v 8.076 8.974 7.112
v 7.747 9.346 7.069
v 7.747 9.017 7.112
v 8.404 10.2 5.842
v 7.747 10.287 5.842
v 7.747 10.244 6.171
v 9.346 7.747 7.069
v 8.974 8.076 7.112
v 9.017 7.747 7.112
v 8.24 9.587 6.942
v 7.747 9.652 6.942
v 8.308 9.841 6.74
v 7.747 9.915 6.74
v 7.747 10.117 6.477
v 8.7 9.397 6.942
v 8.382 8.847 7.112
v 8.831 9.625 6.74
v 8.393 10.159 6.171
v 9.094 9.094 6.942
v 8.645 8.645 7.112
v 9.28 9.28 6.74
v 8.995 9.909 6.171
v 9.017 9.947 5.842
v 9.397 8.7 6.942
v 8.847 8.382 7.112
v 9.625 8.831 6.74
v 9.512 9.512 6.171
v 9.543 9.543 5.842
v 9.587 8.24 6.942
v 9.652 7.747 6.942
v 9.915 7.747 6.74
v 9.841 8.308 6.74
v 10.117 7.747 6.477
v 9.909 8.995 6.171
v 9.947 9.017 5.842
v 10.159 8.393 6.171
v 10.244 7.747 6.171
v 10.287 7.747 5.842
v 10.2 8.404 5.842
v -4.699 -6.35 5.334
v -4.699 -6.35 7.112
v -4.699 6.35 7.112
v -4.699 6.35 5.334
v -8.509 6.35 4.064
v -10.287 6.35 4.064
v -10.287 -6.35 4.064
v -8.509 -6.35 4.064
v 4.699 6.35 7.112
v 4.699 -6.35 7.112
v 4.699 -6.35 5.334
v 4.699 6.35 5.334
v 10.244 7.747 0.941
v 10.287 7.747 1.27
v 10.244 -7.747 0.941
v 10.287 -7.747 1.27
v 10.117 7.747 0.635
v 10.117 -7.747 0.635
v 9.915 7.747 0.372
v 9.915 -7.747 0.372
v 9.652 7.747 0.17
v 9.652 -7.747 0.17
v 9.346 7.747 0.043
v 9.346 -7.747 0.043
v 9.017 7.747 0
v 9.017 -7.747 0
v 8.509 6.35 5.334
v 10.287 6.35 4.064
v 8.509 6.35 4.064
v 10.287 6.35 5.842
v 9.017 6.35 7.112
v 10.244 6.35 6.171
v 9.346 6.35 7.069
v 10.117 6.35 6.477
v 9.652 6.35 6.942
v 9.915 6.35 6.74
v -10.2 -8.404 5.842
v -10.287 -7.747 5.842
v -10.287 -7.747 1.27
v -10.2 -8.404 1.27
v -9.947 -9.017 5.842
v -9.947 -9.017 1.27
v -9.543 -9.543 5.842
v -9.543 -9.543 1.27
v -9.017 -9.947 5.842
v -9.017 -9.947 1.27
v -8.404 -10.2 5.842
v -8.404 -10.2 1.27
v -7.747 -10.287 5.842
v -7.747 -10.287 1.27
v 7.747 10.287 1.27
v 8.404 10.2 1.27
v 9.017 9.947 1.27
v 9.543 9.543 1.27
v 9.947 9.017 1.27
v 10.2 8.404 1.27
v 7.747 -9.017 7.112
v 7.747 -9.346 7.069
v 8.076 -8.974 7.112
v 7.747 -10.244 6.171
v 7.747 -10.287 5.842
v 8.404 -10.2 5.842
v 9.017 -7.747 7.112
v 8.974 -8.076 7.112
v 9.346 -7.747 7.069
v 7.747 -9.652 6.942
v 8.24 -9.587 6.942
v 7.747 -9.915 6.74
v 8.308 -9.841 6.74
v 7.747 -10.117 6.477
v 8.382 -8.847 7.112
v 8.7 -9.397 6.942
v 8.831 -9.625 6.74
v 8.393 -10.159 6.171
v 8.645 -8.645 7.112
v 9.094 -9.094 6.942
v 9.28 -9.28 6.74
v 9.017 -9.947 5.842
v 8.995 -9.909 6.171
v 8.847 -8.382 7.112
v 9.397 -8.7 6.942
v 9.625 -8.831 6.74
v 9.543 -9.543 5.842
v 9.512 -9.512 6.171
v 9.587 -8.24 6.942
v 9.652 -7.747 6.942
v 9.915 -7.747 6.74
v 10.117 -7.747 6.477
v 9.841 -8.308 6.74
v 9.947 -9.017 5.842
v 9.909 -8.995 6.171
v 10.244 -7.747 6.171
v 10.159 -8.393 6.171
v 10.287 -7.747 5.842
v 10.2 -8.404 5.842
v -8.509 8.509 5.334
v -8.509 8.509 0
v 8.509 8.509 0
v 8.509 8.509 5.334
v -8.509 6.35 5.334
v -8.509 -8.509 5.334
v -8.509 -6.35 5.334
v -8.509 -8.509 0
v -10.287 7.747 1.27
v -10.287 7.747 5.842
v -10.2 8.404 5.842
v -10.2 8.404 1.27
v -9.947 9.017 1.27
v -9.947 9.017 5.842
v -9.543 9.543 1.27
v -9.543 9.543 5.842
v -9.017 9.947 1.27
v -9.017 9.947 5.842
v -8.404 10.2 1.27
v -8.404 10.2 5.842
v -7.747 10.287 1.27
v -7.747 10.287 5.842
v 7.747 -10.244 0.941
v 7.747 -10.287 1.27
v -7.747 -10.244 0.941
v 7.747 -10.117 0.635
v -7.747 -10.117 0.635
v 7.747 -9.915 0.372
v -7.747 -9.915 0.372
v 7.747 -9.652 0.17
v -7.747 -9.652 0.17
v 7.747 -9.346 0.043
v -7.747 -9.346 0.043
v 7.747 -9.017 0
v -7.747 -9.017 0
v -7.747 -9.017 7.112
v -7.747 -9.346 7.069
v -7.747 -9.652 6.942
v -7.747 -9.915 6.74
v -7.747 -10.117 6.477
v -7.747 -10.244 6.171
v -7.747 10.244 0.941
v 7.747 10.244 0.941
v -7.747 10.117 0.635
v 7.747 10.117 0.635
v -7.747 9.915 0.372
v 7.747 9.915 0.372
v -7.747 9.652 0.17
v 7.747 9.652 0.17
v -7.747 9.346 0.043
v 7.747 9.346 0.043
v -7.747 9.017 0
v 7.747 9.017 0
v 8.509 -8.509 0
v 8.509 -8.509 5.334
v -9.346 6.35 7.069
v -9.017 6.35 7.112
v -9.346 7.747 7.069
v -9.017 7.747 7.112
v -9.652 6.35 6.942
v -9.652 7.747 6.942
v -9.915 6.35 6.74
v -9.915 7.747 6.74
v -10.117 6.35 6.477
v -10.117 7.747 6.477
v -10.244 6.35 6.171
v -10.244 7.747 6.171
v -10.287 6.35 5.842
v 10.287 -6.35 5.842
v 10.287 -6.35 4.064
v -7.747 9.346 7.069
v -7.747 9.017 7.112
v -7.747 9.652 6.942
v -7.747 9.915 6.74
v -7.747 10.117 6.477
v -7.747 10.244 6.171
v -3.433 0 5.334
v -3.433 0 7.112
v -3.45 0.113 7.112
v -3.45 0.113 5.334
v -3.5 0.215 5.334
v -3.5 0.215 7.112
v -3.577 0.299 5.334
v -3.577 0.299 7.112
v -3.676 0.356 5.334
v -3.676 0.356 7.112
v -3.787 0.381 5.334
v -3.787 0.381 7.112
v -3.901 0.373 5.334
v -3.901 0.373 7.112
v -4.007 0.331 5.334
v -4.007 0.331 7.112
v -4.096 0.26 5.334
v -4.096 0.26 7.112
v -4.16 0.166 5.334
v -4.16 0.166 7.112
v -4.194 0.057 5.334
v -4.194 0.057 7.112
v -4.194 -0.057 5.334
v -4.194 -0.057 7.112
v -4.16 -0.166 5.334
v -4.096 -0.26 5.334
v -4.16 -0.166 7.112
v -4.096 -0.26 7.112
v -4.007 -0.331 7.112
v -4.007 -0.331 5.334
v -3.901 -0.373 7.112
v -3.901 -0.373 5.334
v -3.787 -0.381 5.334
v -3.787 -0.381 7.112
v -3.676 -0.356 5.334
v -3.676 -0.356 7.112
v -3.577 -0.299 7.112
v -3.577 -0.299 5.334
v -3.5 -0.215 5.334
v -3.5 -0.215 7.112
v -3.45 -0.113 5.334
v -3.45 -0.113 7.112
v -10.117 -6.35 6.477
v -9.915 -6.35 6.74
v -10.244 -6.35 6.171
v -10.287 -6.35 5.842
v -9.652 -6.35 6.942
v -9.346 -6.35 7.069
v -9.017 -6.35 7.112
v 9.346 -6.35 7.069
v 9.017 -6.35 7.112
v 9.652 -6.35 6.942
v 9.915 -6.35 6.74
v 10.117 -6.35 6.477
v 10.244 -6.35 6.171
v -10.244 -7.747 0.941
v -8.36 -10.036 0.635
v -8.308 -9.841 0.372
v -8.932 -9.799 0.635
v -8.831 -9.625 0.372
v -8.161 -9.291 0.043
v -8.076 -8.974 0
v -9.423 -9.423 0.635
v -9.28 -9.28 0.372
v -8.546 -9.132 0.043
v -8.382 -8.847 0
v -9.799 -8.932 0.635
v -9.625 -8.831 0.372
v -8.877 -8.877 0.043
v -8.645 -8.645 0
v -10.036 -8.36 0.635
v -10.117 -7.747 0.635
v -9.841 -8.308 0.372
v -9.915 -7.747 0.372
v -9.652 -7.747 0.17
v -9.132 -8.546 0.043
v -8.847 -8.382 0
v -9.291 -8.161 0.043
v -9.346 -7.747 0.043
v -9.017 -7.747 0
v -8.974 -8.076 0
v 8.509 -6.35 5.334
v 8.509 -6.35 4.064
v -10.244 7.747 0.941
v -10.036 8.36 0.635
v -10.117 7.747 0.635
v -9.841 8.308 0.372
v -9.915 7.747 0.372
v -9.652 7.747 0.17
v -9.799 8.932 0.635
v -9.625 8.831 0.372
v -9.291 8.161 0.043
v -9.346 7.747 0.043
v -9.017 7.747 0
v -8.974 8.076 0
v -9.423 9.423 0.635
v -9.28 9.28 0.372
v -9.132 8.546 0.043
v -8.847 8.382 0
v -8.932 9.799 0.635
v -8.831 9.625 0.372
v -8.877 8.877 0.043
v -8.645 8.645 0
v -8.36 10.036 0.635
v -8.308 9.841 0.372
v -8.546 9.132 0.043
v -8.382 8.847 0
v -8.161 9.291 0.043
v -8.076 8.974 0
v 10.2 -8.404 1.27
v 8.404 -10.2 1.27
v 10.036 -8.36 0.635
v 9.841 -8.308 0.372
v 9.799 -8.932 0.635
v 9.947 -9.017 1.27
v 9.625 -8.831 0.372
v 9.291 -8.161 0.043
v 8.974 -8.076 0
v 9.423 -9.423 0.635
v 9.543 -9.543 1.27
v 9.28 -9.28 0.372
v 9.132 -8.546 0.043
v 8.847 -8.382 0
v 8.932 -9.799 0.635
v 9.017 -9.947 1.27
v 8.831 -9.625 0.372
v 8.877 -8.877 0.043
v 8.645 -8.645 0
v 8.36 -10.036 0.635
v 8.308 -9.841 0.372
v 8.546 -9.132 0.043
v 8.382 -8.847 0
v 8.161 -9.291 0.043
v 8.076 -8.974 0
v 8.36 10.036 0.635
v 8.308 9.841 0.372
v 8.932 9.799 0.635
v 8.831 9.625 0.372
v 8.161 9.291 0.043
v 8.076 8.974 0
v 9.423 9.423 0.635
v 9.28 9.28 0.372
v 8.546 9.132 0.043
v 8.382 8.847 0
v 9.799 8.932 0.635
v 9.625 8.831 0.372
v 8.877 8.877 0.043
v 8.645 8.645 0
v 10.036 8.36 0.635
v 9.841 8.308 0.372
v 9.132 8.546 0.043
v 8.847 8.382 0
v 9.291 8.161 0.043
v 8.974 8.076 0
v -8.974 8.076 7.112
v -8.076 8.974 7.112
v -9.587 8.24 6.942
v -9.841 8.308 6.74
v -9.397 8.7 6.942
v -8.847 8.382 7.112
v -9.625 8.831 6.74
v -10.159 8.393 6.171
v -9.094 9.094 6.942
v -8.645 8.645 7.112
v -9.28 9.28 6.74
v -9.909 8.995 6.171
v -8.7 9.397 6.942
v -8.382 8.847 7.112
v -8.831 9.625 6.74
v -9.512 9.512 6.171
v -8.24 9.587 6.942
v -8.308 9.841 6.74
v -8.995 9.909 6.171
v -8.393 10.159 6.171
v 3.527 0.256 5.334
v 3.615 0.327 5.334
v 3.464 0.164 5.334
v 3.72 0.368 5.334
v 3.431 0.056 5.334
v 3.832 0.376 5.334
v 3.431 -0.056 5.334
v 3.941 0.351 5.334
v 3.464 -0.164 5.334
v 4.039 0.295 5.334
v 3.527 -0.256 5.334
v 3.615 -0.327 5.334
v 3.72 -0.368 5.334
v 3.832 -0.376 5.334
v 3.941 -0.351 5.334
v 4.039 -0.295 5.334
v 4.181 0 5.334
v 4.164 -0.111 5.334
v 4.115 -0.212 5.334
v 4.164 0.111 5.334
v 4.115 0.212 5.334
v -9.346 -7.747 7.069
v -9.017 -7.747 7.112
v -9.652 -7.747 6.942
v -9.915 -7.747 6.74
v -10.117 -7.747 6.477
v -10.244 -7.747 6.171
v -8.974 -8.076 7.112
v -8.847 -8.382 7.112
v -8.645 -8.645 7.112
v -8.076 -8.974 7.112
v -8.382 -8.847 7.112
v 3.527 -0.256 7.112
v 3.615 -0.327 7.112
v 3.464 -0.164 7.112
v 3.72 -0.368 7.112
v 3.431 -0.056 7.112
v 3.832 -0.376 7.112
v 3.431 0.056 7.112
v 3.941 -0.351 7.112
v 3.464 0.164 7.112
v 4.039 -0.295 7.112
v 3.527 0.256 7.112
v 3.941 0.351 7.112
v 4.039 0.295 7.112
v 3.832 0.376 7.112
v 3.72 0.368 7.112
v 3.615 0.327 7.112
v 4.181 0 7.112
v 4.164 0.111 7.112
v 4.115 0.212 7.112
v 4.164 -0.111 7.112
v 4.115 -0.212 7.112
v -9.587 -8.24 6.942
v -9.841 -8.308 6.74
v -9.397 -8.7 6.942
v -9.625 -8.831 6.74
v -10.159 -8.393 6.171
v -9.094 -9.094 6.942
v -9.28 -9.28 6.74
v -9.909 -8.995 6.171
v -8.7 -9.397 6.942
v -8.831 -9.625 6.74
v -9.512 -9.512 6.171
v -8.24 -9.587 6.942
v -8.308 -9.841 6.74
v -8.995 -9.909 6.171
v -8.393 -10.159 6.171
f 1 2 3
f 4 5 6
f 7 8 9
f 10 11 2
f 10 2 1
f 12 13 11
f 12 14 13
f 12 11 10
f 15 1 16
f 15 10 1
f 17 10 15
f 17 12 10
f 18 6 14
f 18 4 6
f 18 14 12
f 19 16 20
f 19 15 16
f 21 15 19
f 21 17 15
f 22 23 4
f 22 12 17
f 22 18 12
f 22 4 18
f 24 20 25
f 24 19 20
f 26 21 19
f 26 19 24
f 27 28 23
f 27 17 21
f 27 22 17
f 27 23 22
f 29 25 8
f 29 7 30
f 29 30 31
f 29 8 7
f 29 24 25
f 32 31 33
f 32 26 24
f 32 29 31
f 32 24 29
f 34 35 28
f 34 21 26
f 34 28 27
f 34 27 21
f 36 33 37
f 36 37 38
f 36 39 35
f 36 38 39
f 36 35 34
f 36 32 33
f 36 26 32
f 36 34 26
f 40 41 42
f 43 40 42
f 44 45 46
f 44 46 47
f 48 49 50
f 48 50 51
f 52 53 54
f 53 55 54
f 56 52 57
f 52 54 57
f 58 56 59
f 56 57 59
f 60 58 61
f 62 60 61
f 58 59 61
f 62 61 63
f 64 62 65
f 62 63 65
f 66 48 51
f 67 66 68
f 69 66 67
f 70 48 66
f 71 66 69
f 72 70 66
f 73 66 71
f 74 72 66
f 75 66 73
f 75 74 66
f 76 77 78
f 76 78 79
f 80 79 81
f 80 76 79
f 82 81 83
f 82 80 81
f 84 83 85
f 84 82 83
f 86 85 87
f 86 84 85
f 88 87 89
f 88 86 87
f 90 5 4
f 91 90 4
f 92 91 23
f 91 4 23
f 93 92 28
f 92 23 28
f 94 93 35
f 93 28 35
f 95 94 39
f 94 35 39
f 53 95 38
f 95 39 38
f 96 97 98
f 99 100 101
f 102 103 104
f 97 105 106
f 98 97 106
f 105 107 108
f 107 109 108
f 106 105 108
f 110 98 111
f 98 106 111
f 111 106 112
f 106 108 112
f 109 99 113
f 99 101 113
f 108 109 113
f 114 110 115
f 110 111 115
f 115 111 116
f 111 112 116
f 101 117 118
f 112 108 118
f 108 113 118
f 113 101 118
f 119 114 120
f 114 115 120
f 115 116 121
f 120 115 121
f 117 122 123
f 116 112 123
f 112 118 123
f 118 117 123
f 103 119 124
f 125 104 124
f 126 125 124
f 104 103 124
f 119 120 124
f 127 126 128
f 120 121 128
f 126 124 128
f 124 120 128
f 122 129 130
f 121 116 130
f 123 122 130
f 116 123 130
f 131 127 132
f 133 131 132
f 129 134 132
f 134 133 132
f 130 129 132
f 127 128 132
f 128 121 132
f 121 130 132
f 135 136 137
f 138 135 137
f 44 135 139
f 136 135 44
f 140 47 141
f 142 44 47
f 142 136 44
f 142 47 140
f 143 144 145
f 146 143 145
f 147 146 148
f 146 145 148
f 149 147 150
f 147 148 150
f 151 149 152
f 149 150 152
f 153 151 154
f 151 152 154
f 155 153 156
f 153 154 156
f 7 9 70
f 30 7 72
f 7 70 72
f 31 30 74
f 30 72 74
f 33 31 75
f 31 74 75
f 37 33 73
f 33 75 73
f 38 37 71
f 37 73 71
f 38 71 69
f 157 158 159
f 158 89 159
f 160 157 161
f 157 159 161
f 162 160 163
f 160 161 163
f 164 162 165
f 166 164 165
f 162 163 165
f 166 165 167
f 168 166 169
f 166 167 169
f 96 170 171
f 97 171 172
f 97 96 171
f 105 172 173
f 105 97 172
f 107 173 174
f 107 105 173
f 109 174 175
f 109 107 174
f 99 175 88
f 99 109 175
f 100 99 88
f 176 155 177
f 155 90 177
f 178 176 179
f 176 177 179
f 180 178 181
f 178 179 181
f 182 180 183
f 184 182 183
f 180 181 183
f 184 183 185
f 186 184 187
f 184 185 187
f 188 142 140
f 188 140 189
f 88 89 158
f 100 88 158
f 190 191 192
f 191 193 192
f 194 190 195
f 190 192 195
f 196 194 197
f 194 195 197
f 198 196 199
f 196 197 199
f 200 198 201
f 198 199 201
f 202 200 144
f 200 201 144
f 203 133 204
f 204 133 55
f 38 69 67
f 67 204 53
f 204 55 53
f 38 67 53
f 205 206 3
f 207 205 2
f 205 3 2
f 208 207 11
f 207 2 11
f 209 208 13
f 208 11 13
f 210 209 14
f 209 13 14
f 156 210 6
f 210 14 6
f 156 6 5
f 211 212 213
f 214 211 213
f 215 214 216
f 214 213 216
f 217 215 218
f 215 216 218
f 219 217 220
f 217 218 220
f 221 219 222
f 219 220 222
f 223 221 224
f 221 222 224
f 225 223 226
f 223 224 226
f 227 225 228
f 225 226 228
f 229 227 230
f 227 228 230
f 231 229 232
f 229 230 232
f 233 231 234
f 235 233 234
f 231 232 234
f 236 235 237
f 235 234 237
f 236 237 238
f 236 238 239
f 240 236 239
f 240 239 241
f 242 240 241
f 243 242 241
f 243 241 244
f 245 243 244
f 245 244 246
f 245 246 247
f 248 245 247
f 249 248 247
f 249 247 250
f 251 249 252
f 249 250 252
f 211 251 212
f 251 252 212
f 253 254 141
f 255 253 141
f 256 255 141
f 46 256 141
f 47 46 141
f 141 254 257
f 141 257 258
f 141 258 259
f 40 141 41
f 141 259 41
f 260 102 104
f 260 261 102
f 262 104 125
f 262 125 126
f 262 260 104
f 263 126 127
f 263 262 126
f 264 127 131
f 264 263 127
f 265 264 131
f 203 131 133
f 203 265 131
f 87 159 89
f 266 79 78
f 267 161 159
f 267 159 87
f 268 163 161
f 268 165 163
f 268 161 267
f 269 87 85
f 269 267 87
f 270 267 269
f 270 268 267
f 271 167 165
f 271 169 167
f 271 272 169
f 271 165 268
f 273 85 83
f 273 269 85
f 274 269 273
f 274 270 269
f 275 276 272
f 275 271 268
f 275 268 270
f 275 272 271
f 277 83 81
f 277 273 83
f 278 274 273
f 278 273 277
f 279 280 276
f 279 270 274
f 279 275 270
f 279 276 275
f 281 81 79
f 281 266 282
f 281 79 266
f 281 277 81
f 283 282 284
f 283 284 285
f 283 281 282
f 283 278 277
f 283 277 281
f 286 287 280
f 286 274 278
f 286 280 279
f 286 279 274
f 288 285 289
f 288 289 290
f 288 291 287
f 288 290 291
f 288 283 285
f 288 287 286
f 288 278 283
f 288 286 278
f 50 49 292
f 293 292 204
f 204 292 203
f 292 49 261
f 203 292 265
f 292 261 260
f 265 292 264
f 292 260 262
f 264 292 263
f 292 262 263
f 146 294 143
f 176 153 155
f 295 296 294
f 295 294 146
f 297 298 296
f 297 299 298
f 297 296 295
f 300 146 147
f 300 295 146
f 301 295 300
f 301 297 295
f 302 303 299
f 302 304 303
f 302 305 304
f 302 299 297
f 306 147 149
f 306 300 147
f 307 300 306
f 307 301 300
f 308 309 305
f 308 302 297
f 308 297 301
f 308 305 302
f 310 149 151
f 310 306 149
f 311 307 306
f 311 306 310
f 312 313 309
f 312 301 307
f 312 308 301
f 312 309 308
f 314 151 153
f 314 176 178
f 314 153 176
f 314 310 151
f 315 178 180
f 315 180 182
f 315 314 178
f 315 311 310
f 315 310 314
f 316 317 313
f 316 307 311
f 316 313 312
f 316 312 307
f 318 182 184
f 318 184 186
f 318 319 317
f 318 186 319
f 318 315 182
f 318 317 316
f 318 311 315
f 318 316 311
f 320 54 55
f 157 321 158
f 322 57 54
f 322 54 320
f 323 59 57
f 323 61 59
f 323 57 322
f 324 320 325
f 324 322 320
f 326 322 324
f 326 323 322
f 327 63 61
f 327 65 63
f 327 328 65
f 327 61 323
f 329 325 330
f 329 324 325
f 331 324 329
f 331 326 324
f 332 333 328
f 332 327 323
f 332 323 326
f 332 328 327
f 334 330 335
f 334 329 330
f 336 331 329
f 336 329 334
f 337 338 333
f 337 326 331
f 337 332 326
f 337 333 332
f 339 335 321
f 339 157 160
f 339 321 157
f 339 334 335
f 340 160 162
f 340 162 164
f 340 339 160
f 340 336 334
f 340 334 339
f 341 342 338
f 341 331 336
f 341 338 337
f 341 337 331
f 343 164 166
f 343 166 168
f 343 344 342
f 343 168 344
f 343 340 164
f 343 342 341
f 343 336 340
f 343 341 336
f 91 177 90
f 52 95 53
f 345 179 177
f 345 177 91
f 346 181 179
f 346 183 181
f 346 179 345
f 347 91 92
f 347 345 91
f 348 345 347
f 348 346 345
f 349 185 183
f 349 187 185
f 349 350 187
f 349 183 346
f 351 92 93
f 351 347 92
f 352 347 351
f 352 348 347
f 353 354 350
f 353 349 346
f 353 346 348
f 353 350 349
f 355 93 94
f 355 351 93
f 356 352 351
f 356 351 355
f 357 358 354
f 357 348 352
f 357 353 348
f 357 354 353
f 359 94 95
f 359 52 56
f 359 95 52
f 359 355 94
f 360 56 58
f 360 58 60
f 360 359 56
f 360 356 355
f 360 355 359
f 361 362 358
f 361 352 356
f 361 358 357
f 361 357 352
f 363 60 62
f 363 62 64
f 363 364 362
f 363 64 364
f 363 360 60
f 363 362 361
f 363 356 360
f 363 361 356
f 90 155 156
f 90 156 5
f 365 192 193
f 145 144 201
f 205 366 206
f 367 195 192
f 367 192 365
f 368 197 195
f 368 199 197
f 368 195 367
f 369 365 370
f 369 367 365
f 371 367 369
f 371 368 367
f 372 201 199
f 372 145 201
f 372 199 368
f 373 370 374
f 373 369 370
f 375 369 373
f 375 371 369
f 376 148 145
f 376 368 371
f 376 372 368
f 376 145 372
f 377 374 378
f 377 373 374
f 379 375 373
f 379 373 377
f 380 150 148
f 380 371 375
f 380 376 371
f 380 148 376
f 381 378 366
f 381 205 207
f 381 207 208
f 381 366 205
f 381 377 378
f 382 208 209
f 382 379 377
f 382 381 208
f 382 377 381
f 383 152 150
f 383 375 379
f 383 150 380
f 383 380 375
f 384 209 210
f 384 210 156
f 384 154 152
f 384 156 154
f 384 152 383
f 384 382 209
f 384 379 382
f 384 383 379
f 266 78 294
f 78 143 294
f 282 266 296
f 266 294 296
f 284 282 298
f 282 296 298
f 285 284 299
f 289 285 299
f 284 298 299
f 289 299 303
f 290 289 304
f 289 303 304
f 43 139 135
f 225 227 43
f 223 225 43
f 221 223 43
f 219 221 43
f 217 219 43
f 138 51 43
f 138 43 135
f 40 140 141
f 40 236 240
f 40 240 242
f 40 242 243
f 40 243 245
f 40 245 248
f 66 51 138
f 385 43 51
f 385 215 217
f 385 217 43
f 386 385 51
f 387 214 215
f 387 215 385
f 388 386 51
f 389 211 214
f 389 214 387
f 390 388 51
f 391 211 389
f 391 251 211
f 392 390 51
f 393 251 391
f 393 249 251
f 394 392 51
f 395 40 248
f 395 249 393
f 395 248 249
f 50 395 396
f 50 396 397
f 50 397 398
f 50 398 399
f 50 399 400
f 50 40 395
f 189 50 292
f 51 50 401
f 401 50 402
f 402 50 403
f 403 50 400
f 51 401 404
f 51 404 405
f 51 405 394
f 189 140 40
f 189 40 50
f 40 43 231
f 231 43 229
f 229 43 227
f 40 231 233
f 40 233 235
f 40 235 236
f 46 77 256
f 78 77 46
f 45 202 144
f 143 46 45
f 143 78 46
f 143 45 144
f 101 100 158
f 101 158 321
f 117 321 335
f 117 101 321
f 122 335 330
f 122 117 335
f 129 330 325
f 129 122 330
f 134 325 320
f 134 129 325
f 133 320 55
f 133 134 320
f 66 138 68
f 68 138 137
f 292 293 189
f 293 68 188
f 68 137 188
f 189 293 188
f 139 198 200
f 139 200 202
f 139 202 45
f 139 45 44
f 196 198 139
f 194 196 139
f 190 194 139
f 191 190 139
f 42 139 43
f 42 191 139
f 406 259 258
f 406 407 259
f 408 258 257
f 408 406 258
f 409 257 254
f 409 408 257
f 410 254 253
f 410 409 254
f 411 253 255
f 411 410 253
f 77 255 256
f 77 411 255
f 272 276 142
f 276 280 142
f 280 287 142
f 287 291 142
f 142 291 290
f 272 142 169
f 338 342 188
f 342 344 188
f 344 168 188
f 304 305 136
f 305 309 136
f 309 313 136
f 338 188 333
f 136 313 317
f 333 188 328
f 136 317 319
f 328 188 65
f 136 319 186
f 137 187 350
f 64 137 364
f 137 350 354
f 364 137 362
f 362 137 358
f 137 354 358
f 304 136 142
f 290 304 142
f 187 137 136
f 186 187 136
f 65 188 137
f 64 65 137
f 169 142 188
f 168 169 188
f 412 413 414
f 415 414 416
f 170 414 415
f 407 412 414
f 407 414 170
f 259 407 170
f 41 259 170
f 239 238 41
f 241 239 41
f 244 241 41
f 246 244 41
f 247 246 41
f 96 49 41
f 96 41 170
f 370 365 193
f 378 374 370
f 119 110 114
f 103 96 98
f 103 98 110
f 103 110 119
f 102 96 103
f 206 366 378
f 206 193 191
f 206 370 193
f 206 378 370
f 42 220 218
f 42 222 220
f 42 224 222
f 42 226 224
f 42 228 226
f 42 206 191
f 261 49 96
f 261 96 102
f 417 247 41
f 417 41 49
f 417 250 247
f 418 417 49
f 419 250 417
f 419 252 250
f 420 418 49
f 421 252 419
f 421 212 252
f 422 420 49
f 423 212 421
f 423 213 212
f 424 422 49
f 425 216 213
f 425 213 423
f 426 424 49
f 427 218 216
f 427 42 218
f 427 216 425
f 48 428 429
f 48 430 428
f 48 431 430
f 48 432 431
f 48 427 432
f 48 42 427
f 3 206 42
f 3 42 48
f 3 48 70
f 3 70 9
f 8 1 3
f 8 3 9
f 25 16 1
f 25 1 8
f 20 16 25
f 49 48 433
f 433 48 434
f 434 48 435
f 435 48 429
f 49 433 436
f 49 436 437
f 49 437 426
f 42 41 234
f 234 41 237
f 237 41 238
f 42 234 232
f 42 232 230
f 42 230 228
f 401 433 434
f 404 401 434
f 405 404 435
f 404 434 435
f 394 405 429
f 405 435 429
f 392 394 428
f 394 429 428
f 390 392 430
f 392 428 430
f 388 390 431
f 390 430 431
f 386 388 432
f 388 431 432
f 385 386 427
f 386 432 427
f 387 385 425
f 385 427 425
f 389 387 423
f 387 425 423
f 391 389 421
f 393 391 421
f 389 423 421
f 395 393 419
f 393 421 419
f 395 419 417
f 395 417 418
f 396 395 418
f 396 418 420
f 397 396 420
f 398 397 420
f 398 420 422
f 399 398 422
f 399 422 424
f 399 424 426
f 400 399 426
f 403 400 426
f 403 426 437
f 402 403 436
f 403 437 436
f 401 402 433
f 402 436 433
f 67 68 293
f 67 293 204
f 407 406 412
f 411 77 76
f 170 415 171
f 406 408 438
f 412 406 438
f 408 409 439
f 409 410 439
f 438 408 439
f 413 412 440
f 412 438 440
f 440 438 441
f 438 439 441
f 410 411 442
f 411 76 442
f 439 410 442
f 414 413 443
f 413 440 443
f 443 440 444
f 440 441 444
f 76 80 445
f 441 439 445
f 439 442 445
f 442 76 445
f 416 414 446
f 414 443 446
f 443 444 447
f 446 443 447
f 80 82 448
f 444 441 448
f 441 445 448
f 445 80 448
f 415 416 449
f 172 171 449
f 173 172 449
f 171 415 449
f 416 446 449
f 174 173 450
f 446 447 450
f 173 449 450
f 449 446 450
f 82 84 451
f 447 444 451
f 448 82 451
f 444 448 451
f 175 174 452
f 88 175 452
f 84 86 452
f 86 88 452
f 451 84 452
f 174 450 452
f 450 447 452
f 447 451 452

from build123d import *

# Parameters (mm, degrees)
F0_W      = 20.574
F0_H      = 20.574
F1_DEPTH  = 7.112
F2_W      = 17.018
F2_H      = 17.018
F3_DEPTH  = 5.334
F4_R      = 2.54
F5_W      = 5.588
F5_H      = 12.7
F6_DEPTH  = 3.048
F7_W      = 11.176
F7_H      = 12.7
F8_DEPTH  = 3.048
F9_R      = 0.3824187843
F9_R_2    = 0.3770429502
F10_DEPTH = 1.778
F11_R     = 1.27
F12_R     = 1.27


with BuildPart() as f1:
    # F0 (on Top) → F1 (new body)
    with BuildSketch(Plane.XY):
        Rectangle(F0_W, F0_H)
    extrude(amount=F1_DEPTH)

    # F2 (on face) → F3 (cut)
    with BuildSketch(Plane(origin=(0, 0, 0), x_dir=(1, 0, 0), z_dir=(0, 0, -1))):
        Rectangle(F2_W, F2_H)
    extrude(amount=-F3_DEPTH, mode=Mode.SUBTRACT)

    # F4
    f4_edges = [f1.edges().sort_by_distance(p)[0] for p in [
        (-10.287, -10.287, 3.556),
        (10.287, 10.287, 3.556),
        (10.287, -10.287, 3.556),
        (-10.287, 10.287, 3.556),
    ]]
    fillet(f4_edges, radius=F4_R)

    # F5 (on face) → F6 (cut)
    with BuildSketch(Plane.XY.offset(7.112)):
        with Locations((-7.493, 0)):
            Rectangle(F5_W, F5_H)
    extrude(amount=-F6_DEPTH, mode=Mode.SUBTRACT)

    # F7 (on face) → F8 (cut)
    with BuildSketch(Plane.XY.offset(7.112)):
        with Locations((10.287, 0)):
            Rectangle(F7_W, F7_H)
    extrude(amount=-F8_DEPTH, mode=Mode.SUBTRACT)

    # F9 (on face) → F10 (cut)
    with BuildSketch(Plane.XY.offset(7.112)):
        with Locations((-3.8157331292, 0)):
            Circle(F9_R)
        with Locations((3.8035737816, 0)):
            Circle(F9_R_2)
    extrude(amount=-F10_DEPTH, mode=Mode.SUBTRACT)

    # F11
    f11_edges = [f1.edges().sort_by_distance(p)[0] for p in [
        (0, 10.287, 7.112),
        (0, -10.287, 7.112),
    ]]
    fillet(f11_edges, radius=F11_R)

    # F12
    f12_edges = [f1.edges().sort_by_distance(p)[0] for p in [
        (-10.287, 0, 0),
        (0, 10.287, 0),
        (-9.543051, 9.543051, 0),
    ]]
    fillet(f12_edges, radius=F12_R)


solid = f1.part
